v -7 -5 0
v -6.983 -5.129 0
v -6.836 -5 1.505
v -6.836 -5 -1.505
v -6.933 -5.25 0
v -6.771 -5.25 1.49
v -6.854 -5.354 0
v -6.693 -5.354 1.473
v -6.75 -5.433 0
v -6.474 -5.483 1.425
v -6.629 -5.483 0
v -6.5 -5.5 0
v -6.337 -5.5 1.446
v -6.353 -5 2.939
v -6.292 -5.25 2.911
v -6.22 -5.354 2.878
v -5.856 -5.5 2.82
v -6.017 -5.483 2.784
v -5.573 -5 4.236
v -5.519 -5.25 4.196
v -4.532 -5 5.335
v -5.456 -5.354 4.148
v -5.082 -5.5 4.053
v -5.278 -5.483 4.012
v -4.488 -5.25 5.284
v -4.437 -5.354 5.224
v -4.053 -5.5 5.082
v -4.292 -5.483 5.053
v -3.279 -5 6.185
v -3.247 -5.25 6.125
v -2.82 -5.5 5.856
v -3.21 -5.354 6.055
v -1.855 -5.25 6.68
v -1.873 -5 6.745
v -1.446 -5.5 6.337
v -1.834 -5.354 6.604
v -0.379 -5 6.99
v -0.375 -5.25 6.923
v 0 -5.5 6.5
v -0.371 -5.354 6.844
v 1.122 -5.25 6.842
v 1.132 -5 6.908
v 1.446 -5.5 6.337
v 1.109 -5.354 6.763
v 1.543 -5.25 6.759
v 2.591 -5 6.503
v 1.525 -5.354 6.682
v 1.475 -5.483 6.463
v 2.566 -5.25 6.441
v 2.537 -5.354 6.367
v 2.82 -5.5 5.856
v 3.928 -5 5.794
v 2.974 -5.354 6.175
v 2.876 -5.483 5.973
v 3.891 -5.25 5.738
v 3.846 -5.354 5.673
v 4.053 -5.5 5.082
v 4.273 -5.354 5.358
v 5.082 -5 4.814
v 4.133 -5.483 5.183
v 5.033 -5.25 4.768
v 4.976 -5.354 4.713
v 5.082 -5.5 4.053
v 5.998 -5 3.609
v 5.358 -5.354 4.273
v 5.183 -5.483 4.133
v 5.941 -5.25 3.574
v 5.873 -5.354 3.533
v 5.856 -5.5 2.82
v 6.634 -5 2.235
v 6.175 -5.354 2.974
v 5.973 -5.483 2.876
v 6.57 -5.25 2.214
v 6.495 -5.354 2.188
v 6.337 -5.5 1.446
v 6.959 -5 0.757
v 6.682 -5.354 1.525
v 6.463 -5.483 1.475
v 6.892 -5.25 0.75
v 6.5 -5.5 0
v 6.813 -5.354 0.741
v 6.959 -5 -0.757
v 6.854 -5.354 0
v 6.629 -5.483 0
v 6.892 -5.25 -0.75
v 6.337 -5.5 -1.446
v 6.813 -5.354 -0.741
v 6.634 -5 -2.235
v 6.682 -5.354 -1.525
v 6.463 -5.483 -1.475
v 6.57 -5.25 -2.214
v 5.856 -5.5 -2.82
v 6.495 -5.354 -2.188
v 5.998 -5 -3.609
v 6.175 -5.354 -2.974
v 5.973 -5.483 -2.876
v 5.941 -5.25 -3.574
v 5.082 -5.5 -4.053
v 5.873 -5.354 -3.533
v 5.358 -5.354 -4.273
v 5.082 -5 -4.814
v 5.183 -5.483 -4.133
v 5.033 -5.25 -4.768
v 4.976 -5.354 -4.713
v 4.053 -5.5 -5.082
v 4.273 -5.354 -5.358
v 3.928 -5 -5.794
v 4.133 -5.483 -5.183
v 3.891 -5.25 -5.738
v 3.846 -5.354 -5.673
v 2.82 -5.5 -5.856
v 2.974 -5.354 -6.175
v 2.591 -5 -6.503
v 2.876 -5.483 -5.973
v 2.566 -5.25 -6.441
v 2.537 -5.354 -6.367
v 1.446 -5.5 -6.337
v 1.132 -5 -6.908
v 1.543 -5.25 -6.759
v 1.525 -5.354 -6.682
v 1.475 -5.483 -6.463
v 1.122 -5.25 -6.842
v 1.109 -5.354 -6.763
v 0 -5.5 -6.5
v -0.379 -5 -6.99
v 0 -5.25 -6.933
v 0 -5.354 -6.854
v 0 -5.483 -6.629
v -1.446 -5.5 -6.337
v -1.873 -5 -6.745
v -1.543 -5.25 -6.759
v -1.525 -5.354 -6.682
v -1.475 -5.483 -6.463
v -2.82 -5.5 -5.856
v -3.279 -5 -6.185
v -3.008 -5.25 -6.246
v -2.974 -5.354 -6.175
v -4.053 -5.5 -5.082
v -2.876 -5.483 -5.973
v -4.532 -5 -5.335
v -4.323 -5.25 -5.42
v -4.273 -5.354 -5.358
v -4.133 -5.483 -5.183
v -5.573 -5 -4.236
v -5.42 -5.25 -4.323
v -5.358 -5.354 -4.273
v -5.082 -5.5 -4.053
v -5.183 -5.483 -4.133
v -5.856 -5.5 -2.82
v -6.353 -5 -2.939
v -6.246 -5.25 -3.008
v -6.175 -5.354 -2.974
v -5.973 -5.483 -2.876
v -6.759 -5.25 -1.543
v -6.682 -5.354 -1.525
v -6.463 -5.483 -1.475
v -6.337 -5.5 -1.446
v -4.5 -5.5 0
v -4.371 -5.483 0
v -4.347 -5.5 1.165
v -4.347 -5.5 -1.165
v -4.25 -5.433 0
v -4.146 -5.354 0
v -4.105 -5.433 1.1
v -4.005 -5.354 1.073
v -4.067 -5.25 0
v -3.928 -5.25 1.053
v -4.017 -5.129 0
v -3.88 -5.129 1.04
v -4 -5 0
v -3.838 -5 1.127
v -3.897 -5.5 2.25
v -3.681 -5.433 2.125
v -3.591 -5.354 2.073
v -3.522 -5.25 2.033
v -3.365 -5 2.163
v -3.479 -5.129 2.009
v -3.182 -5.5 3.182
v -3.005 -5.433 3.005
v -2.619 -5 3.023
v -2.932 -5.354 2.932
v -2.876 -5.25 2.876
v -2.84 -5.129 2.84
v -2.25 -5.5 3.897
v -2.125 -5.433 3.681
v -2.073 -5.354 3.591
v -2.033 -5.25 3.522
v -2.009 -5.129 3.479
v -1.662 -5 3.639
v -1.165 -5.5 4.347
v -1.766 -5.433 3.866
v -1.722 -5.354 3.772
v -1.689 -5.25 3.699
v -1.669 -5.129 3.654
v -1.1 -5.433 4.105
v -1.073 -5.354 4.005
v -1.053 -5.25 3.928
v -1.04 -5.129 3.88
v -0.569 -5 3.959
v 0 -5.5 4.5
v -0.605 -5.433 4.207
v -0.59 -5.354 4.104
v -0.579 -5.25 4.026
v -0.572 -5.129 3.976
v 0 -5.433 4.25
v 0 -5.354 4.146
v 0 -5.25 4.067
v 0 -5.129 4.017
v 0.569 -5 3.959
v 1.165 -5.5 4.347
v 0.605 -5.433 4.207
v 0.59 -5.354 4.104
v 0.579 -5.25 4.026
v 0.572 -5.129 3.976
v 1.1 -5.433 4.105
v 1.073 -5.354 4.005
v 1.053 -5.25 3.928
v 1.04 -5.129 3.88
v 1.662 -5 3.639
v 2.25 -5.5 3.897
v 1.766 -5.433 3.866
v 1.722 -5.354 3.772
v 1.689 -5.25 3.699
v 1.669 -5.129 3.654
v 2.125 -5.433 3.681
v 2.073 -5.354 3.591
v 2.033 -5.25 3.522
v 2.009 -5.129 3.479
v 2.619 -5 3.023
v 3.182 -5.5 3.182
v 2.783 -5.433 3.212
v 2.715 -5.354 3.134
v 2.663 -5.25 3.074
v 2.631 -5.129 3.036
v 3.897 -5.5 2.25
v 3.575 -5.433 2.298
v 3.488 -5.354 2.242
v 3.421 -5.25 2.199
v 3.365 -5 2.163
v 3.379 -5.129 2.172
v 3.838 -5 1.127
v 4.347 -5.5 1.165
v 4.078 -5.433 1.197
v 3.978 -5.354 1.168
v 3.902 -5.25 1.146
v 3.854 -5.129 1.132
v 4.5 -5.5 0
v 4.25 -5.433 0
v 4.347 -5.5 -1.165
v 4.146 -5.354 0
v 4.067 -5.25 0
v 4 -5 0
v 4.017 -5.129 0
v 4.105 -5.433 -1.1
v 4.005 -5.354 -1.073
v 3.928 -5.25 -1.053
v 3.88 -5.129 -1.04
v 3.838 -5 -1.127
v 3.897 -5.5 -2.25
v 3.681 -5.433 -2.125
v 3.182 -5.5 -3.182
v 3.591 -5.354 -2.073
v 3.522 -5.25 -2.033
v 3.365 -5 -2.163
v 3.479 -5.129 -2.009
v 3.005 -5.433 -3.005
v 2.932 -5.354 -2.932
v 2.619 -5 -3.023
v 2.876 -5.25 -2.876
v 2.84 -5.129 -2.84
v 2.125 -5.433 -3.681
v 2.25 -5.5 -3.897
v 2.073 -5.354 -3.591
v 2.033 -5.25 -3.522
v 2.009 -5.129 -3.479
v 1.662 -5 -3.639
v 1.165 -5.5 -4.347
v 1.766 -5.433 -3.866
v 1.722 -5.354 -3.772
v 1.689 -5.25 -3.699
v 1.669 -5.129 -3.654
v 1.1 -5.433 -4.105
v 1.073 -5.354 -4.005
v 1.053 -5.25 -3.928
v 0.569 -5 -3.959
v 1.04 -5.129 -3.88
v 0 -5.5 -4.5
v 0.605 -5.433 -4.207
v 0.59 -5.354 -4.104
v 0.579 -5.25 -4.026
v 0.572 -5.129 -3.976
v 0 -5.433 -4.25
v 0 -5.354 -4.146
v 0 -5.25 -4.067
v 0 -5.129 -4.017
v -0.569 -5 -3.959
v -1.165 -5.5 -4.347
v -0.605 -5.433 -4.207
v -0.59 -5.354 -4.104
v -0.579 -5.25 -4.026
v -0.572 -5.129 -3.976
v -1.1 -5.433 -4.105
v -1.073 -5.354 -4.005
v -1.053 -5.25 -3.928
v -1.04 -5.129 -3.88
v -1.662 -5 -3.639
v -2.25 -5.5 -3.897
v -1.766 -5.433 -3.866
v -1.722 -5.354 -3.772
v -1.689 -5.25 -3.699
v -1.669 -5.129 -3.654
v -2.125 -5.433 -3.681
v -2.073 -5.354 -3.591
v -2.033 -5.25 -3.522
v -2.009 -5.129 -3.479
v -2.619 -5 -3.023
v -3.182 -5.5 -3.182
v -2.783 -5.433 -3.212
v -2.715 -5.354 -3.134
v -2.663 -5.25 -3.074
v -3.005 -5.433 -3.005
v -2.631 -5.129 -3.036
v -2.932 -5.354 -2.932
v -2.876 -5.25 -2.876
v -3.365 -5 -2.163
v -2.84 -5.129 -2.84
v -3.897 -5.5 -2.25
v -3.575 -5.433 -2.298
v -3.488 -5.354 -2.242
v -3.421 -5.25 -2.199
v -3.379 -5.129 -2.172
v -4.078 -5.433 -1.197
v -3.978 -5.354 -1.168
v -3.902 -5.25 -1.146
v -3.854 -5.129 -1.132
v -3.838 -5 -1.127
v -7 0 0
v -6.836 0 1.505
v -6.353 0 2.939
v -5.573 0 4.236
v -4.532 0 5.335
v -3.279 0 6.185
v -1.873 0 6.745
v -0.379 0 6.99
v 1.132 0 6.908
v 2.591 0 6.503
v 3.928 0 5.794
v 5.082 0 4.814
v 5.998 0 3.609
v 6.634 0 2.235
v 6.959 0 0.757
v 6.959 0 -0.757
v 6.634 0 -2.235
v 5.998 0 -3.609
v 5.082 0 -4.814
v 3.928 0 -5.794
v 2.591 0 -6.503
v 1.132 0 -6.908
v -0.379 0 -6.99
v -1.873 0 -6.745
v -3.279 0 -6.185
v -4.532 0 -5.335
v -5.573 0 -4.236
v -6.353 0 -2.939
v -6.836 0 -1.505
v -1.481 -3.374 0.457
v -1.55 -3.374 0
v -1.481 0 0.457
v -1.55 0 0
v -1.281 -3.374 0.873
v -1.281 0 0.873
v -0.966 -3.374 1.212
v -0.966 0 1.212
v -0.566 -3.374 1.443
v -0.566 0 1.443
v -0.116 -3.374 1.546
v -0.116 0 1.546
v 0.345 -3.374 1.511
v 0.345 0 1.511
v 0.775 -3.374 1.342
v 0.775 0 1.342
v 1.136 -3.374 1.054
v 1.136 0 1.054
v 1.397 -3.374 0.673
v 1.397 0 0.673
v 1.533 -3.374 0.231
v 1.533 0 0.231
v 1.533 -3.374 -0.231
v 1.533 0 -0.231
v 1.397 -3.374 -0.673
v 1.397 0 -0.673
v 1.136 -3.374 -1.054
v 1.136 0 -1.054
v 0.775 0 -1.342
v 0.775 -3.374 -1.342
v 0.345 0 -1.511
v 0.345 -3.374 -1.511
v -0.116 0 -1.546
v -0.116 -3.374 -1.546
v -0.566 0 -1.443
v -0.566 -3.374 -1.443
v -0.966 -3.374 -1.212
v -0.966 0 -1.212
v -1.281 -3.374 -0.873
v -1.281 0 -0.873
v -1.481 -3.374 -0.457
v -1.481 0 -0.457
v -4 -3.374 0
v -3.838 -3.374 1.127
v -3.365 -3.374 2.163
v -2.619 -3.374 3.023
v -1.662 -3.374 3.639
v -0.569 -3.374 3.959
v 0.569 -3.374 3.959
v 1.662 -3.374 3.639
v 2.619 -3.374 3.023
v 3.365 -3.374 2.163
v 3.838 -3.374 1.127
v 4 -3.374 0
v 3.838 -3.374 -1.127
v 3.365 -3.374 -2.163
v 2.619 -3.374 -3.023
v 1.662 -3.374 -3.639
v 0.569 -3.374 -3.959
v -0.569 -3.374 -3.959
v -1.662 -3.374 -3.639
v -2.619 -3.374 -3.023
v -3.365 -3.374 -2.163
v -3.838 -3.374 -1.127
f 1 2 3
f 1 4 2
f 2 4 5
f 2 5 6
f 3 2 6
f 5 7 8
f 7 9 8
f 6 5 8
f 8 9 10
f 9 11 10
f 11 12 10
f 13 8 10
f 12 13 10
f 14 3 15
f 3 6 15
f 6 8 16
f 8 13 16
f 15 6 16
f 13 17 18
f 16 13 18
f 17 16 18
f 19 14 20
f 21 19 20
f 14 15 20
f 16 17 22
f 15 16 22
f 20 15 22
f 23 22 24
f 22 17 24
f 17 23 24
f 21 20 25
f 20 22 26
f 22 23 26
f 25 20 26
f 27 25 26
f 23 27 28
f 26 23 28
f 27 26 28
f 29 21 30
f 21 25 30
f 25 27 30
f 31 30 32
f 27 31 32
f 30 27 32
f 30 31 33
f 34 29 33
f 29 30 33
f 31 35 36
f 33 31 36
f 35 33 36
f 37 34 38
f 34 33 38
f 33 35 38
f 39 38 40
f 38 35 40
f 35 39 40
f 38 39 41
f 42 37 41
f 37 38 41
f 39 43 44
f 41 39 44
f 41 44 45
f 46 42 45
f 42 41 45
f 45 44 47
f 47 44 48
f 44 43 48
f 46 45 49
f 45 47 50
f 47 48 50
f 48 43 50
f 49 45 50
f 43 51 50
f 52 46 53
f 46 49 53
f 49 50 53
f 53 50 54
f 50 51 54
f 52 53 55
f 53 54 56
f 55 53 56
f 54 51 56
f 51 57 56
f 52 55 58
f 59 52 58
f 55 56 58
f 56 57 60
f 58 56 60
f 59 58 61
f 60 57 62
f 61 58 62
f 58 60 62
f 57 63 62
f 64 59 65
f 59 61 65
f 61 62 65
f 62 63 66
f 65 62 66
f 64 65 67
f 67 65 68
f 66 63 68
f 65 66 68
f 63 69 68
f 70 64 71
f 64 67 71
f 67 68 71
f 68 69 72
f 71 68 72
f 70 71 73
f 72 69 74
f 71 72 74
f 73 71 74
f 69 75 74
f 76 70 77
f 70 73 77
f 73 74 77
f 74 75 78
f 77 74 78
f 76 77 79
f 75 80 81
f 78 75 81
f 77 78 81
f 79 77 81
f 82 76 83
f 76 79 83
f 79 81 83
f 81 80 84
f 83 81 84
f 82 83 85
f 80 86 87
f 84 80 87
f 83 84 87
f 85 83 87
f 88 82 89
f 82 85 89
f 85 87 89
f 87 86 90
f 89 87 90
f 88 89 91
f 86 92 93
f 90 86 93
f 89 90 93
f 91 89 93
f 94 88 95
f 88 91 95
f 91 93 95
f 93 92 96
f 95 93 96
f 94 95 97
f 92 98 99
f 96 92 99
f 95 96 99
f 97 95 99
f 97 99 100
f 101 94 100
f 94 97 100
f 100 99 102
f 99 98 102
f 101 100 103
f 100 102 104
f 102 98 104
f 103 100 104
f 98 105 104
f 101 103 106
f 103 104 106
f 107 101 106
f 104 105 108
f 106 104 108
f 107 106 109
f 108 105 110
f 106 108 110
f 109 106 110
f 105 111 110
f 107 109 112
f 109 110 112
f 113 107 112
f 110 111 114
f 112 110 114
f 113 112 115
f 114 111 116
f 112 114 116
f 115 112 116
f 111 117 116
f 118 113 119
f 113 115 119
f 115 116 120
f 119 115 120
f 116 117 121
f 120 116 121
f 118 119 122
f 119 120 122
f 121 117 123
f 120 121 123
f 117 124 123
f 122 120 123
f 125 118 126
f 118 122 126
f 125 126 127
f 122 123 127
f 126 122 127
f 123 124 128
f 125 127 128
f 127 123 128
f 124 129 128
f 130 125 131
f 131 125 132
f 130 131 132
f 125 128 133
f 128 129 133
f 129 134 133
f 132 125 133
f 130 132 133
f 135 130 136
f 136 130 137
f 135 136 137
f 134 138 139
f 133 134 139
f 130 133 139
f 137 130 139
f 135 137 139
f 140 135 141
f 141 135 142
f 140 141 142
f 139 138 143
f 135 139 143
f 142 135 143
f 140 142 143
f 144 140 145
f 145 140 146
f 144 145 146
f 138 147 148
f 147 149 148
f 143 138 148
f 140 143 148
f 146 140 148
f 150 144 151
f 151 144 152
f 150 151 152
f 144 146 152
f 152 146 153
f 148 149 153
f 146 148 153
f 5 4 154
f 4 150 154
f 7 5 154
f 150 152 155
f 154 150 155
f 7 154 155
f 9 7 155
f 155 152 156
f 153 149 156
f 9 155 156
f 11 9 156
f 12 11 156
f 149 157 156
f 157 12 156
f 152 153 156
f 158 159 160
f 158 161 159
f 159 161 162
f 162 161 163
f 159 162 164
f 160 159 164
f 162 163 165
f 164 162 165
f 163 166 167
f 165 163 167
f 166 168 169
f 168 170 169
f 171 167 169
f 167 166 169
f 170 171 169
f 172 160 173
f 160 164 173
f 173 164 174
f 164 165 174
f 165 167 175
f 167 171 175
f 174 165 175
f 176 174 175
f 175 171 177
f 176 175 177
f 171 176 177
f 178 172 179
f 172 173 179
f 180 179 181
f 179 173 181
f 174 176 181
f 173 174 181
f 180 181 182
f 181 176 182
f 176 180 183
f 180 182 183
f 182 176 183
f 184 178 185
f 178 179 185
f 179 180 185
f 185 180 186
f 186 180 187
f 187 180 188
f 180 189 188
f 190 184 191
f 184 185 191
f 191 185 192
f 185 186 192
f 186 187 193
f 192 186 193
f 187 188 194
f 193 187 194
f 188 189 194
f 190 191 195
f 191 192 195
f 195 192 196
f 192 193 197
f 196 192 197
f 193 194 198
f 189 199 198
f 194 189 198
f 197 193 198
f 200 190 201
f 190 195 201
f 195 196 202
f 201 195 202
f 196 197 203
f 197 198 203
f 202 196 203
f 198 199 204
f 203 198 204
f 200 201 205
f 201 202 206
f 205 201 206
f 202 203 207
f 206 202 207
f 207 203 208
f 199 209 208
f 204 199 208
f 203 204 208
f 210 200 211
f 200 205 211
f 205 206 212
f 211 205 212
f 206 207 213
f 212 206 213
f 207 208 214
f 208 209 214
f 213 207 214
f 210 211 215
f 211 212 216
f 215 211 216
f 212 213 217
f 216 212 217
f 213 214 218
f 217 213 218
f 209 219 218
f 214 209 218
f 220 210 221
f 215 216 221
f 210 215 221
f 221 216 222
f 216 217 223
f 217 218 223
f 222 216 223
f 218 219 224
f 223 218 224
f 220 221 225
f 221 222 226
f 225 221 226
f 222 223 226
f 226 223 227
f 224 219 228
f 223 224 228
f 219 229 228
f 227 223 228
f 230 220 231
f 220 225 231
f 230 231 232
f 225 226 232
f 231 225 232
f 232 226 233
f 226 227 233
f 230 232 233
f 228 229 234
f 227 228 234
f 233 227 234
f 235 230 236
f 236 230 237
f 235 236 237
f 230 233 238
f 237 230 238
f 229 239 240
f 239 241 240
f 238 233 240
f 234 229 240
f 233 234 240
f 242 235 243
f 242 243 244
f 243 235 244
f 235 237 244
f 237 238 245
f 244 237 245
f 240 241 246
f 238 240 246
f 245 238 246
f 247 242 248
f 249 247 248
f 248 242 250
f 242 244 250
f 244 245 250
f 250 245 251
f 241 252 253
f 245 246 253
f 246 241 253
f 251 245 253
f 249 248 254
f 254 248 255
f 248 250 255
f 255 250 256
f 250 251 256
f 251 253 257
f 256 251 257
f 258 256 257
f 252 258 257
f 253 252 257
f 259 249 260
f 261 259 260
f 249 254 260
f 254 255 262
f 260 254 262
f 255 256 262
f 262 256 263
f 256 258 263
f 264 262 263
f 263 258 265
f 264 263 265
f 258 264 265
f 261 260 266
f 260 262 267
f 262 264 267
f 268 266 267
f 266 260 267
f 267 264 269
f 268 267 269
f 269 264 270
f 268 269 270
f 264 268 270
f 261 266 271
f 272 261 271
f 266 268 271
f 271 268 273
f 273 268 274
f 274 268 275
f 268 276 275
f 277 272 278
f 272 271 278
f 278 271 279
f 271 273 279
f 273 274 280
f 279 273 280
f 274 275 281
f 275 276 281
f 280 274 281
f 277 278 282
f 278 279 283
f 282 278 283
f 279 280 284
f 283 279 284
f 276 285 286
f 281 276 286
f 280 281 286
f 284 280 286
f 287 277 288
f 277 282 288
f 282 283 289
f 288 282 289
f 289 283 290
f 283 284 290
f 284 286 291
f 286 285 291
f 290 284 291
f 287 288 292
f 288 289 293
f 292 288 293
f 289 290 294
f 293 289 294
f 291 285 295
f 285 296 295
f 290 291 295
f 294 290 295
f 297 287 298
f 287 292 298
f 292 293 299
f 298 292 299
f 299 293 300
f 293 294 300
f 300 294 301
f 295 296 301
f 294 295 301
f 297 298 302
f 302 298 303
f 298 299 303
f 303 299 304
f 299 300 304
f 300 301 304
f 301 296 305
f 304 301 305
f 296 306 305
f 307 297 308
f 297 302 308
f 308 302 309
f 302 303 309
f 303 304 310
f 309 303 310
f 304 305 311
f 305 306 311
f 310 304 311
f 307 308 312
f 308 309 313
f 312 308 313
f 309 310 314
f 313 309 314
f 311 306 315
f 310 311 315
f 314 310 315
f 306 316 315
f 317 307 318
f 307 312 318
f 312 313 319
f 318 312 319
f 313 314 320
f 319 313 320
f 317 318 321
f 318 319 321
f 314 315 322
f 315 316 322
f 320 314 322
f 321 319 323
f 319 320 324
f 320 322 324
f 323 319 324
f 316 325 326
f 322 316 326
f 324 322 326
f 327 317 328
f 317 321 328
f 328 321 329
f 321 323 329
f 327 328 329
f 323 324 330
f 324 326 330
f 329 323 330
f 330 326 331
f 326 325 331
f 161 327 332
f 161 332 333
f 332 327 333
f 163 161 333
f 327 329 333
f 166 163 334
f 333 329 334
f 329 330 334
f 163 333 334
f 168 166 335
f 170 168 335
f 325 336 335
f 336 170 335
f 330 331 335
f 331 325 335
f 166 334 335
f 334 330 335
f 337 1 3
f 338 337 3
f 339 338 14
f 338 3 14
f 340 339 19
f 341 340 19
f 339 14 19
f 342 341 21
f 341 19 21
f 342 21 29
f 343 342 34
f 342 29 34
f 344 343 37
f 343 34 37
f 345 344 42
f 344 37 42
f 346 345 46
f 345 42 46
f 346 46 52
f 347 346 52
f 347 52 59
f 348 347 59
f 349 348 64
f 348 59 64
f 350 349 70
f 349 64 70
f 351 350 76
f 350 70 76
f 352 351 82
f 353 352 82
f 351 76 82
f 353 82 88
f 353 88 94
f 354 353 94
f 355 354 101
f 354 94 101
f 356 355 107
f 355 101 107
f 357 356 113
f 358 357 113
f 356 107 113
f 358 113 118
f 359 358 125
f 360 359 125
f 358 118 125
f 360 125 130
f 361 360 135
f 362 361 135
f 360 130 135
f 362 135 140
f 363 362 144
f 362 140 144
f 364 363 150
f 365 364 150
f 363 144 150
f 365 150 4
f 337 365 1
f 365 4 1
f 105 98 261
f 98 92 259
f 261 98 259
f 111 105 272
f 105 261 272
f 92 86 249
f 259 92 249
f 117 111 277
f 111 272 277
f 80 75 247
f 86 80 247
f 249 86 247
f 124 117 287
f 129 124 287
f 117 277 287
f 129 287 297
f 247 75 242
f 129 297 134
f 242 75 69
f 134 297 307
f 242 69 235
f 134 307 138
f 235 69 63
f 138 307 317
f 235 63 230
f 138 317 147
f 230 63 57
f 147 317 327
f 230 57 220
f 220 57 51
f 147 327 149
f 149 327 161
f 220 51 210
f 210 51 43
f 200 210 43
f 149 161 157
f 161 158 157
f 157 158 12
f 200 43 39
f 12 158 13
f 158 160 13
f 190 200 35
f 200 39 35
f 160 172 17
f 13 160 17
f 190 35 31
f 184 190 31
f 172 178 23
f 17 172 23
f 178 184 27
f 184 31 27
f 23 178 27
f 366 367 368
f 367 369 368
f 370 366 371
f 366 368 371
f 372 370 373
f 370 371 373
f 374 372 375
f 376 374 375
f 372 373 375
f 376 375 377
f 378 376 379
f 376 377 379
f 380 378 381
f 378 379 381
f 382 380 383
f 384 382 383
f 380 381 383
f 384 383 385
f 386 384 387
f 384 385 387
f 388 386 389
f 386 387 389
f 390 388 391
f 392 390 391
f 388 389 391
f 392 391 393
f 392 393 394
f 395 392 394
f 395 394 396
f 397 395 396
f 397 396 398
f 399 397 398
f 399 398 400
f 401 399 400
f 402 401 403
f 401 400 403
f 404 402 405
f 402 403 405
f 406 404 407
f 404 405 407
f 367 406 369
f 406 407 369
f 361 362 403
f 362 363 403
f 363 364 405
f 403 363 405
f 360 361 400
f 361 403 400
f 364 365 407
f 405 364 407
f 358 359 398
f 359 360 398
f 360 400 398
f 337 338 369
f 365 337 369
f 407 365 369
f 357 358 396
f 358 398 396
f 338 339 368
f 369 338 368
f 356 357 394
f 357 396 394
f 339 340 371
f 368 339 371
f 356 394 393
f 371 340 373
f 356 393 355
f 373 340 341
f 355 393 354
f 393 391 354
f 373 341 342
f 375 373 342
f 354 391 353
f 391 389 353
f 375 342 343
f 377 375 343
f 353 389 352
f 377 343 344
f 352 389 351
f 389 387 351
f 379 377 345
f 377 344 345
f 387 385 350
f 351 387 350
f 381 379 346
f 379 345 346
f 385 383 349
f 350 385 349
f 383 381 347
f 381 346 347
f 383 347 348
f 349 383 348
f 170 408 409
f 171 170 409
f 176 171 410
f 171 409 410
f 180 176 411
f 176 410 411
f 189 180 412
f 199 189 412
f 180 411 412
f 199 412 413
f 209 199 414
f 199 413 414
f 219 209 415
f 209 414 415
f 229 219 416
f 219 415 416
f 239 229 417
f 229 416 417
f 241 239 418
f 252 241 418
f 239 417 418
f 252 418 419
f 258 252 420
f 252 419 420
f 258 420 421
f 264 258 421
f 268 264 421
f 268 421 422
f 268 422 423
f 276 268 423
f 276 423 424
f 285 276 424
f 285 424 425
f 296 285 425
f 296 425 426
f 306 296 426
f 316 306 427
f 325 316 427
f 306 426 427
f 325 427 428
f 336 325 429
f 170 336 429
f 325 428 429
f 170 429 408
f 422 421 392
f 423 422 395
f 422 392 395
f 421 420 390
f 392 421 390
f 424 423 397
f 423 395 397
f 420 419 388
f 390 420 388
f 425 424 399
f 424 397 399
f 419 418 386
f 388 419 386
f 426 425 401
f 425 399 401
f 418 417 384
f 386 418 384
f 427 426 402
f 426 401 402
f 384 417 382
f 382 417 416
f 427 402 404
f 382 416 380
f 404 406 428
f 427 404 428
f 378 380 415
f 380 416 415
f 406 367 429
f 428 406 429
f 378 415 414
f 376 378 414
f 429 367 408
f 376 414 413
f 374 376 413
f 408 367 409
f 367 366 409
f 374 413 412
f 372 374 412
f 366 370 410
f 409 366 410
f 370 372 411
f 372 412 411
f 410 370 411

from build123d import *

# Parameters (mm, degrees)
FILLET1_R = 0.5


with BuildPart() as part:
    # Sketch1 → Revolve1 (revolve)
    with BuildSketch(Plane.XY):
        Polygon((-1.55, 0), (-7, 0), (-7, -5.5), (-4, -5.5), (-4, -3.373831776), (-1.55, -3.373831776), align=None)
    revolve(axis=Axis((0, 0, 0), (0, 1, 0)))

    # Fillet1
    fillet1_edges = [part.edges().sort_by_distance(p)[0] for p in [
        (4, -5.5, 0),
        (7, -5.5, 0),
    ]]
    fillet(fillet1_edges, radius=FILLET1_R)


solid = part.part
